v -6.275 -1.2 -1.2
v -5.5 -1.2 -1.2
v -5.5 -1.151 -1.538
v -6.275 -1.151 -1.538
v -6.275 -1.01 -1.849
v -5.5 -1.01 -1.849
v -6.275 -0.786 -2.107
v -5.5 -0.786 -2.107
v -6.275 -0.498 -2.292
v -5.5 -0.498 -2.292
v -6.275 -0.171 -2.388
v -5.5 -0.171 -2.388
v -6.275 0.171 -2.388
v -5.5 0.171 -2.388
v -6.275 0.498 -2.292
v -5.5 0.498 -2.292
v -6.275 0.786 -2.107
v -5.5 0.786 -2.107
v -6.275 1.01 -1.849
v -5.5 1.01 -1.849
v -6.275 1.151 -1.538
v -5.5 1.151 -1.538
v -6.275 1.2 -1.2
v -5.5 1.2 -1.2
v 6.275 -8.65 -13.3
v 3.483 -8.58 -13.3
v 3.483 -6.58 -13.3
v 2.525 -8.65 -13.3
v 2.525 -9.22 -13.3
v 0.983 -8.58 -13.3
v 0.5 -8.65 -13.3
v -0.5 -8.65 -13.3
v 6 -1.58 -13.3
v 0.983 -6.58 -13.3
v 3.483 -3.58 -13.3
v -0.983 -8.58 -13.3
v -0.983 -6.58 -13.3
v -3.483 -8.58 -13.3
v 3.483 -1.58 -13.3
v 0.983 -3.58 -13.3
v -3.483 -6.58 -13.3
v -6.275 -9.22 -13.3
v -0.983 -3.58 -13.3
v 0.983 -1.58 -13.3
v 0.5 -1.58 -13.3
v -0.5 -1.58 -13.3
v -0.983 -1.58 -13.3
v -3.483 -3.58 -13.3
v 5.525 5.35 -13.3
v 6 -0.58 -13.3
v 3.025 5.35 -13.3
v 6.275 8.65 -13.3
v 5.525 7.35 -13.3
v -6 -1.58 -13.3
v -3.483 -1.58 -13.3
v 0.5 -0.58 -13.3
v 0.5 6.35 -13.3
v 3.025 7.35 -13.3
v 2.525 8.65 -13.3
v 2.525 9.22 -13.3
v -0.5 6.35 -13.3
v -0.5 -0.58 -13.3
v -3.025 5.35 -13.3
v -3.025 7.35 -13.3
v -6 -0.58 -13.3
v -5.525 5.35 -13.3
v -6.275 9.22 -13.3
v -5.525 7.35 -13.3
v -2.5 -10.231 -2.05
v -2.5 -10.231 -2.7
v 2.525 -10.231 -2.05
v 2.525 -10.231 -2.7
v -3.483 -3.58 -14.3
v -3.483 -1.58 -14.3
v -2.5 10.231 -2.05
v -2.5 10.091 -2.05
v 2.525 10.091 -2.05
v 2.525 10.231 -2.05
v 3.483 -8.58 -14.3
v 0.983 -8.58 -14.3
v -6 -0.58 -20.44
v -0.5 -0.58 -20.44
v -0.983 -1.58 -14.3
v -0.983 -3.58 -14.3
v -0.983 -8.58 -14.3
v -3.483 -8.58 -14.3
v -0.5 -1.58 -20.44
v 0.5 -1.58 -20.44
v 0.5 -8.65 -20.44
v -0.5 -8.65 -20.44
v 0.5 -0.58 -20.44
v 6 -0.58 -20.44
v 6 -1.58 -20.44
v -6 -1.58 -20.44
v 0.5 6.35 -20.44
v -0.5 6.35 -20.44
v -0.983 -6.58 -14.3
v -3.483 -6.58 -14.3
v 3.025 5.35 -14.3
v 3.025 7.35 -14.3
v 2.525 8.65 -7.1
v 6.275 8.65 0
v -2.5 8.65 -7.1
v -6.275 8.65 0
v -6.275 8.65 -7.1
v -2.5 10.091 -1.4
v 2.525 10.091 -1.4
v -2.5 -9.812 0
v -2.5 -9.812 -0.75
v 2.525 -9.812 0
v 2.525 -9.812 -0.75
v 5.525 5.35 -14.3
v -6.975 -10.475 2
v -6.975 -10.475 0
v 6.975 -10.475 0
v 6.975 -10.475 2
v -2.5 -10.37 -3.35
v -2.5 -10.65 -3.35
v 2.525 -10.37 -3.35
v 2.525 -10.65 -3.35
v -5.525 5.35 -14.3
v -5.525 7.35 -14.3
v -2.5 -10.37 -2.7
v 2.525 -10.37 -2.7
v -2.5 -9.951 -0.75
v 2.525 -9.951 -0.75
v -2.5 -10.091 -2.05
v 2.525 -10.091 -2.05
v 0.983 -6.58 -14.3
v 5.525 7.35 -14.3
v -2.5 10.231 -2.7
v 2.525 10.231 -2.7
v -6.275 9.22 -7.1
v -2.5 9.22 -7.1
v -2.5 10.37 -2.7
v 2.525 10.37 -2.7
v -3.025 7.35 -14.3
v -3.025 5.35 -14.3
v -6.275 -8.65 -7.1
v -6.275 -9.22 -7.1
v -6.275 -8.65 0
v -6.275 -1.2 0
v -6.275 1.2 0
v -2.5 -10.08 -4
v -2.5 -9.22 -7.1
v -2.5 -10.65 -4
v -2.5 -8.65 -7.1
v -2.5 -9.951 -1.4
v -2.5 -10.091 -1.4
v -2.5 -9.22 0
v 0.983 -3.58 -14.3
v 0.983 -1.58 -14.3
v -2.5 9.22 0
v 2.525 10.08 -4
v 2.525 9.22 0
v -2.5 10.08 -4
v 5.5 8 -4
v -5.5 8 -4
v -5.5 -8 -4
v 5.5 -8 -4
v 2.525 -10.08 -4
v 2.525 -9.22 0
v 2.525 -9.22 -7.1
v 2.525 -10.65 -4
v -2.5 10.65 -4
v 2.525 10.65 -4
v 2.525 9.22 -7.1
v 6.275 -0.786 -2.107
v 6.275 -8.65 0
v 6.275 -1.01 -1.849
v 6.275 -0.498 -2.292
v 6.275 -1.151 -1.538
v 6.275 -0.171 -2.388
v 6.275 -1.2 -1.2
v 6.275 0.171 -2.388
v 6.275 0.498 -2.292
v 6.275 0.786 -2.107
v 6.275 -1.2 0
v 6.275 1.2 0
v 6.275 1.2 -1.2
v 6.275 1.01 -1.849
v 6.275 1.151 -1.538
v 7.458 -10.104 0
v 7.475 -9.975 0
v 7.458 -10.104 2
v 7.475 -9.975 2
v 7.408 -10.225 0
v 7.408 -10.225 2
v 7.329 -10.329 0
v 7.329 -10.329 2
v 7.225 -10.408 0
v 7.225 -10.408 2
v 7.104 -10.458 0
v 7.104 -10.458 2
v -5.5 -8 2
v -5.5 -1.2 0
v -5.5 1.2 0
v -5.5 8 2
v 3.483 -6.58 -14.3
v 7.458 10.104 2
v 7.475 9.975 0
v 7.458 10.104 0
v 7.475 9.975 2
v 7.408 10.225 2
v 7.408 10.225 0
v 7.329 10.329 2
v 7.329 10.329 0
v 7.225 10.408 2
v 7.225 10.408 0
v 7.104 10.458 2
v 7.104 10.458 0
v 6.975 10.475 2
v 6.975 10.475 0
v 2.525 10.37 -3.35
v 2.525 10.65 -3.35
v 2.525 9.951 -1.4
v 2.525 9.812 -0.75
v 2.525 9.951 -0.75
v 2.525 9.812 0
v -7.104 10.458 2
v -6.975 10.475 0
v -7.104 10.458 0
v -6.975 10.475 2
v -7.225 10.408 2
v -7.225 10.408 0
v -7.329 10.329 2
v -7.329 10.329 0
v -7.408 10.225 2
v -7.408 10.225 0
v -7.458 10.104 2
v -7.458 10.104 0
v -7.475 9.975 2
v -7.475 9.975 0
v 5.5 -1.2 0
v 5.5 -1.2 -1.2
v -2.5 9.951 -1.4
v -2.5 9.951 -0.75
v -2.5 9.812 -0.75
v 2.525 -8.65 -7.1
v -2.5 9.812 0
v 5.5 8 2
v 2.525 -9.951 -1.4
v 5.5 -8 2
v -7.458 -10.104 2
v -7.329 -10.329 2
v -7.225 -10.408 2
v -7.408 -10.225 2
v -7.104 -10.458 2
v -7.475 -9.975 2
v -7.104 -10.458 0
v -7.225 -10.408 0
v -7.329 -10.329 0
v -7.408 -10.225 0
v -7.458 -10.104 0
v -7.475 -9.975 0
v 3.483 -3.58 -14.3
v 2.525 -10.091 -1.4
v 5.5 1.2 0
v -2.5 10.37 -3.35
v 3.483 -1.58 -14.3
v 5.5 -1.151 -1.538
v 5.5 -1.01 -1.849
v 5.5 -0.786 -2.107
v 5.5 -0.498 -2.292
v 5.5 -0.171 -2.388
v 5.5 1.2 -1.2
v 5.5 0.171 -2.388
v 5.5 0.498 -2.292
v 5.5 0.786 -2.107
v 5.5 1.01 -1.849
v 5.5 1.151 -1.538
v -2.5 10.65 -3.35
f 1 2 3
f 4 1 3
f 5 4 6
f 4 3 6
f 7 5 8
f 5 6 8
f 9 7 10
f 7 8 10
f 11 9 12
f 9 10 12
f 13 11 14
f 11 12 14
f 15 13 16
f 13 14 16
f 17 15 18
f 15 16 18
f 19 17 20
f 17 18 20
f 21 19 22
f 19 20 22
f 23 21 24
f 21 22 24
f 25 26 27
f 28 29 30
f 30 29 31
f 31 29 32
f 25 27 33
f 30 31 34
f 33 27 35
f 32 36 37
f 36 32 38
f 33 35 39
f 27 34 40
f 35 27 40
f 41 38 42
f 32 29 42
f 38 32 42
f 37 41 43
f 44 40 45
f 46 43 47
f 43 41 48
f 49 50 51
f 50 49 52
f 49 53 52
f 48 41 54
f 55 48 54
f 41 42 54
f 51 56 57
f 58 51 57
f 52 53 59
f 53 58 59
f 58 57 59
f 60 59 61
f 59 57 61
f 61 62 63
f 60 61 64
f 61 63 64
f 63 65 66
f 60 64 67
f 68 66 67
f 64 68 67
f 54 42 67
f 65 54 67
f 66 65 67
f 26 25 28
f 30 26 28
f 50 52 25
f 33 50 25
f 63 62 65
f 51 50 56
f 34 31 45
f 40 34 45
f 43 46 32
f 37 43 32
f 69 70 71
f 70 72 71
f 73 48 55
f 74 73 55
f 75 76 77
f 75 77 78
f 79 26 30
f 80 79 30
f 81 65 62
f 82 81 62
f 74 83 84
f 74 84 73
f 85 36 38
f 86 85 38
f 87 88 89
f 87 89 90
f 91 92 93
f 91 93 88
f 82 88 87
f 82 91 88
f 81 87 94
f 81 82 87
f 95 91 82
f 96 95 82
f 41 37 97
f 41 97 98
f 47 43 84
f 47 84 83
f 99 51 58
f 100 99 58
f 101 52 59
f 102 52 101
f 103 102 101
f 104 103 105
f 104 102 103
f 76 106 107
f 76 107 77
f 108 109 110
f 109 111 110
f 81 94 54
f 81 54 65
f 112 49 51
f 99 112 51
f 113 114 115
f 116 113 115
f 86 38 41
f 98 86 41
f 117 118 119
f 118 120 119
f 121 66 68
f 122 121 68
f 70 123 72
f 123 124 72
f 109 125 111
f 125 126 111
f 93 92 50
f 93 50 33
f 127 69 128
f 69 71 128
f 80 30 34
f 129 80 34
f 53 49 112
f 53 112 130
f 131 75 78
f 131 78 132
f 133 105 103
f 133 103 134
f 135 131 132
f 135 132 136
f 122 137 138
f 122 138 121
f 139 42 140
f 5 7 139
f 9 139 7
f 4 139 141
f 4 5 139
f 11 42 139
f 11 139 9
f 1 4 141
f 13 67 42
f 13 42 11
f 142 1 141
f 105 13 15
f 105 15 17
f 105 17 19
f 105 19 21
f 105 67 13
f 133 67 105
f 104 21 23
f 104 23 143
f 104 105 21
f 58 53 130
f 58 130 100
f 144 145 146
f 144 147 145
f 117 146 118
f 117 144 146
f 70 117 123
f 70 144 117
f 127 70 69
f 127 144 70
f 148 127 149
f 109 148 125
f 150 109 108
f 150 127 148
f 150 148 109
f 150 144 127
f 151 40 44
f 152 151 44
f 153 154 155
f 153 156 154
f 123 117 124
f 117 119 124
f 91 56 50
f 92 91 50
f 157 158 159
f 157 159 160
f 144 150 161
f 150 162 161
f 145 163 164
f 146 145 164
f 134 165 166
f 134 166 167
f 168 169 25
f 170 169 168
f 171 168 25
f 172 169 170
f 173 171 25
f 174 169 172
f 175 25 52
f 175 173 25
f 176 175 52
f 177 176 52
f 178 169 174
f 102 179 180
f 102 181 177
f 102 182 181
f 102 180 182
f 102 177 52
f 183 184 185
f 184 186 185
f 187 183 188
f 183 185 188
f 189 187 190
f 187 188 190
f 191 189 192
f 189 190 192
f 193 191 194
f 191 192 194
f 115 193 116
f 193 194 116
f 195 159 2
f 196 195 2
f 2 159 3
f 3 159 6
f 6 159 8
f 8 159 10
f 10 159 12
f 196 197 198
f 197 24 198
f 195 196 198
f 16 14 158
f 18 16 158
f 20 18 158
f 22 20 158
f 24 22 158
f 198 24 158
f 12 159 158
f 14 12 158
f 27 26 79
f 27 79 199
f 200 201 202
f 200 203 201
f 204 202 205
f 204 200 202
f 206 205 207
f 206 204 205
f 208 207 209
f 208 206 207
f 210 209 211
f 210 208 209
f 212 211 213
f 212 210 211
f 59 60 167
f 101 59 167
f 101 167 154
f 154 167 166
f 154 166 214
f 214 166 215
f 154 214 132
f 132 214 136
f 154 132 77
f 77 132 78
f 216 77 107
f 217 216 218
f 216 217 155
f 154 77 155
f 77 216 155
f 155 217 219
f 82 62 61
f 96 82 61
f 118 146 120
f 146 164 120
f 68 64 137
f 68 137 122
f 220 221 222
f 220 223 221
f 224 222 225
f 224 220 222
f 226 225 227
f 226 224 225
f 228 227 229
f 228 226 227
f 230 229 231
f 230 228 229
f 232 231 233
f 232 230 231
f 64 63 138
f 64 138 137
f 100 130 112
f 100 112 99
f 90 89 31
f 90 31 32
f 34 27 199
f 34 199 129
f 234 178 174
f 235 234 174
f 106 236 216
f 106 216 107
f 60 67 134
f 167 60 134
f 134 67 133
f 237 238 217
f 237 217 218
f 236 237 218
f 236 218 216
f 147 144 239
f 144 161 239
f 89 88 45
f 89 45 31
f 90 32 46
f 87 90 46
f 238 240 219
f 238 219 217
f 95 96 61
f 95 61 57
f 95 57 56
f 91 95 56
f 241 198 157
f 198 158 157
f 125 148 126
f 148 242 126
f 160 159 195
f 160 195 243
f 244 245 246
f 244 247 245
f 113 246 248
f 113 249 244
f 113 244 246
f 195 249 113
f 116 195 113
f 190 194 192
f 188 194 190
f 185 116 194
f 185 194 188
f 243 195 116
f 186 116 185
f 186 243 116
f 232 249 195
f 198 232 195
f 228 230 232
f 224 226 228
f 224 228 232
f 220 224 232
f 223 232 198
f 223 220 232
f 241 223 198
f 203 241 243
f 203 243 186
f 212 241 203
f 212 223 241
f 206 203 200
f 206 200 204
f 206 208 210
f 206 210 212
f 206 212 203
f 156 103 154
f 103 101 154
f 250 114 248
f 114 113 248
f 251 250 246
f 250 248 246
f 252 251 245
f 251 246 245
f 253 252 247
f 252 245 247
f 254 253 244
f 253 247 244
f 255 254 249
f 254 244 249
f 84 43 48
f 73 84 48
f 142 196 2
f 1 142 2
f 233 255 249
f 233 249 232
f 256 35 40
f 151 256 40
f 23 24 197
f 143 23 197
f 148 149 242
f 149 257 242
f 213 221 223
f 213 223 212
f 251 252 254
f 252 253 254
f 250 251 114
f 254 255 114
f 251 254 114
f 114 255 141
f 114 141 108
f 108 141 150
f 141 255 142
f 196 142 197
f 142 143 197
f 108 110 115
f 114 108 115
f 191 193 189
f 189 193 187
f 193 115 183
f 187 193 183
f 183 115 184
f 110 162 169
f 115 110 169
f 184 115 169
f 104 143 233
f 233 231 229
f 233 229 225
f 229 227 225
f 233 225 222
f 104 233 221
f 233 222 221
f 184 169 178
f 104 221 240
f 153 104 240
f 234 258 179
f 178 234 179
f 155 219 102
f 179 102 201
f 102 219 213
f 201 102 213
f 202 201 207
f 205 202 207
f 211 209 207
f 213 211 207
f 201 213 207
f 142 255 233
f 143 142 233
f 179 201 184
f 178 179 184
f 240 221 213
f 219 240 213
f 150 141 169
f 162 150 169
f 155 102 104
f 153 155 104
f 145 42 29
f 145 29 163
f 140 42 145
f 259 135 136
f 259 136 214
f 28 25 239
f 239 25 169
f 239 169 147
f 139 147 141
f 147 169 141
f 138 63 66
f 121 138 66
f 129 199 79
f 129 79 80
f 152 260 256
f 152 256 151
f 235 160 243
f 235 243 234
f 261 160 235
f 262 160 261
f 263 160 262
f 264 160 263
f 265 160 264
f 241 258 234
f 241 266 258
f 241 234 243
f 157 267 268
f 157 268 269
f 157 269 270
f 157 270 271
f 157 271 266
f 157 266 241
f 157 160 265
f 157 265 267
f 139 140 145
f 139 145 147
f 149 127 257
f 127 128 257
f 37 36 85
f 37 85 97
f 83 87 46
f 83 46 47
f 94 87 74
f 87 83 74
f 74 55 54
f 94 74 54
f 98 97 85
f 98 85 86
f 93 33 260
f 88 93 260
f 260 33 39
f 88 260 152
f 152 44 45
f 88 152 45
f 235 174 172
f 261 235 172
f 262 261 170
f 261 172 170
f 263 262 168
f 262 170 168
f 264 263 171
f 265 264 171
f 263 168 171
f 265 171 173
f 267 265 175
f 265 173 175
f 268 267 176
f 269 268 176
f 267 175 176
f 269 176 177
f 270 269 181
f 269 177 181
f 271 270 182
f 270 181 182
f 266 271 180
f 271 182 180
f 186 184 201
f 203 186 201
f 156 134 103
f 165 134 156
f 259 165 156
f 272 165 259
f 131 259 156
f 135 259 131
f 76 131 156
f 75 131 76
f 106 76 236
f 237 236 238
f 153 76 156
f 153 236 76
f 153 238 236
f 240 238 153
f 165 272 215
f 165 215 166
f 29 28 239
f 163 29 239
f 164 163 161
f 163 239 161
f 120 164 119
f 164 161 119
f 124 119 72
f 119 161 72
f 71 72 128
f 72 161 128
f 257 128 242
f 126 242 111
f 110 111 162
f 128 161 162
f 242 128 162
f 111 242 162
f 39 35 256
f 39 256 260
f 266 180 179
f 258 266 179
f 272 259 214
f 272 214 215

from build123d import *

# Parameters (mm, degrees)
SKETCH1_W                = 14.95
SKETCH1_H                = 20.95
SKETCH1_W_2              = 11
SKETCH1_H_2              = 16
BOSS_EXTRUDE1_DEPTH      = 2
SKETCH2_W                = 12.55
SKETCH2_H                = 17.3
BOSS_EXTRUDE2_DEPTH      = 13.3
SKETCH3_W                = 6.2
SKETCH3_H                = 18.44
BOSS_EXTRUDE3_DEPTH      = 8.8
BOSS_EXTRUDE4_DEPTH      = 2.525
BOSS_EXTRUDE4_DEPTH_BACK = 2.5
BOSS_EXTRUDE5_DEPTH      = 7.14
SKETCH6_W                = 2.5
SKETCH6_H                = 2
BOSS_EXTRUDE6_DEPTH      = 1
CUT_EXTRUDE1_DEPTH       = 12.55
SKETCH8_W                = 11
SKETCH8_H                = 16
CUT_EXTRUDE2_DEPTH       = 4
FILLET1_R                = 0.5


with BuildPart() as part:
    # Sketch1 → Boss-Extrude1 (new body)
    with BuildSketch(Plane.XY):
        Rectangle(SKETCH1_W, SKETCH1_H)
        Rectangle(SKETCH1_W_2, SKETCH1_H_2, mode=Mode.SUBTRACT)
    extrude(amount=BOSS_EXTRUDE1_DEPTH)

    # Sketch2 → Boss-Extrude2 (add)
    with BuildSketch(Plane(origin=(0, 0, 0), x_dir=(-1, 0, 0), z_dir=(0, 0, -1))):
        Rectangle(SKETCH2_W, SKETCH2_H)
    extrude(amount=BOSS_EXTRUDE2_DEPTH)

    # Sketch3 → Boss-Extrude3 (add)
    with BuildSketch(Plane.ZY.offset(6.275)):
        with Locations((-10.2, 0)):
            Rectangle(SKETCH3_W, SKETCH3_H)
    extrude(amount=-BOSS_EXTRUDE3_DEPTH)

    # Sketch4 → Boss-Extrude4 (add, two sides)
    with BuildSketch(Plane(origin=(0, 0, 0), x_dir=(0, 0, -1), z_dir=(1, 0, 0))) as boss_extrude4_sk:
        Polygon((7.1, -9.22), (4, -10.65), (3.35, -10.65), (3.35, -10.3705), (2.7, -10.3705), (2.7, -10.23075), (2.05, -10.23075), (2.05, -10.091), (1.4, -10.091), (1.4, -9.95125), (0.75, -9.95125), (0.75, -9.8115), (0, -9.8115), (0, -9.22), (4, -10.08), (7.1, -8.65), align=None)
        Polygon((7.1, 9.22), (7.1, 8.65), (4, 10.08), (0, 9.22), (0, 9.8115), (0.75, 9.8115), (0.75, 9.95125), (1.4, 9.95125), (1.4, 10.091), (2.05, 10.091), (2.05, 10.23075), (2.7, 10.23075), (2.7, 10.3705), (3.35, 10.3705), (3.35, 10.65), (4, 10.65), align=None)
    extrude(amount=BOSS_EXTRUDE4_DEPTH)
    extrude(boss_extrude4_sk.sketch, amount=-BOSS_EXTRUDE4_DEPTH_BACK)

    # Sketch5 → Boss-Extrude5 (add)
    with BuildSketch(Plane(origin=(0, 0, -13.3), x_dir=(-1, 0, 0), z_dir=(0, 0, -1))):
        Polygon((0.5, 6.35), (-0.5, 6.35), (-0.5, -0.58), (-6, -0.58), (-6, -1.58), (-0.5, -1.58), (-0.5, -8.65), (0.5, -8.65), (0.5, -1.58), (6, -1.58), (6, -0.58), (0.5, -0.58), align=None)
    extrude(amount=BOSS_EXTRUDE5_DEPTH)

    # Sketch6 → Boss-Extrude6 (add)
    with BuildSketch(Plane(origin=(0, 0, -13.3), x_dir=(-1, 0, 0), z_dir=(0, 0, -1))):
        with Locations((2.232930788, -2.58)):
            Rectangle(SKETCH6_W, SKETCH6_H)
        with Locations((2.232930788, -7.58)):
            Rectangle(SKETCH6_W, SKETCH6_H)
        with Locations((-2.232930788, -7.58)):
            Rectangle(SKETCH6_W, SKETCH6_H)
        with Locations((-2.232930788, -2.58)):
            Rectangle(SKETCH6_W, SKETCH6_H)
        with Locations((4.275, 6.35)):
            Rectangle(SKETCH6_W, SKETCH6_H)
        with Locations((-4.275, 6.35)):
            Rectangle(SKETCH6_W, SKETCH6_H)
    extrude(amount=BOSS_EXTRUDE6_DEPTH)

    # Sketch7 → Cut-Extrude1 (cut)
    with BuildSketch(Plane(origin=(6.275, 0, 0), x_dir=(0, 0, -1), z_dir=(1, 0, 0))):
        with BuildLine():
            Line((1.2, 1.2), (0, 1.2))
            Line((0, 1.2), (0, -1.2))
            Line((0, -1.2), (1.2, -1.2))
            ThreePointArc((1.2, -1.2), (2.4, 0), (1.2, 1.2))
        make_face()
    extrude(amount=-CUT_EXTRUDE1_DEPTH, mode=Mode.SUBTRACT)

    # Sketch8 → Cut-Extrude2 (cut)
    with BuildSketch(Plane.XY):
        Rectangle(SKETCH8_W, SKETCH8_H)
    extrude(amount=-CUT_EXTRUDE2_DEPTH, mode=Mode.SUBTRACT)

    # Fillet1
    fillet1_edges = [part.edges().sort_by_distance(p)[0] for p in [
        (-7.475, 10.475, 1),
        (7.475, 10.475, 1),
        (7.475, -10.475, 1),
        (-7.475, -10.475, 1),
    ]]
    fillet(fillet1_edges, radius=FILLET1_R)


solid = part.part
